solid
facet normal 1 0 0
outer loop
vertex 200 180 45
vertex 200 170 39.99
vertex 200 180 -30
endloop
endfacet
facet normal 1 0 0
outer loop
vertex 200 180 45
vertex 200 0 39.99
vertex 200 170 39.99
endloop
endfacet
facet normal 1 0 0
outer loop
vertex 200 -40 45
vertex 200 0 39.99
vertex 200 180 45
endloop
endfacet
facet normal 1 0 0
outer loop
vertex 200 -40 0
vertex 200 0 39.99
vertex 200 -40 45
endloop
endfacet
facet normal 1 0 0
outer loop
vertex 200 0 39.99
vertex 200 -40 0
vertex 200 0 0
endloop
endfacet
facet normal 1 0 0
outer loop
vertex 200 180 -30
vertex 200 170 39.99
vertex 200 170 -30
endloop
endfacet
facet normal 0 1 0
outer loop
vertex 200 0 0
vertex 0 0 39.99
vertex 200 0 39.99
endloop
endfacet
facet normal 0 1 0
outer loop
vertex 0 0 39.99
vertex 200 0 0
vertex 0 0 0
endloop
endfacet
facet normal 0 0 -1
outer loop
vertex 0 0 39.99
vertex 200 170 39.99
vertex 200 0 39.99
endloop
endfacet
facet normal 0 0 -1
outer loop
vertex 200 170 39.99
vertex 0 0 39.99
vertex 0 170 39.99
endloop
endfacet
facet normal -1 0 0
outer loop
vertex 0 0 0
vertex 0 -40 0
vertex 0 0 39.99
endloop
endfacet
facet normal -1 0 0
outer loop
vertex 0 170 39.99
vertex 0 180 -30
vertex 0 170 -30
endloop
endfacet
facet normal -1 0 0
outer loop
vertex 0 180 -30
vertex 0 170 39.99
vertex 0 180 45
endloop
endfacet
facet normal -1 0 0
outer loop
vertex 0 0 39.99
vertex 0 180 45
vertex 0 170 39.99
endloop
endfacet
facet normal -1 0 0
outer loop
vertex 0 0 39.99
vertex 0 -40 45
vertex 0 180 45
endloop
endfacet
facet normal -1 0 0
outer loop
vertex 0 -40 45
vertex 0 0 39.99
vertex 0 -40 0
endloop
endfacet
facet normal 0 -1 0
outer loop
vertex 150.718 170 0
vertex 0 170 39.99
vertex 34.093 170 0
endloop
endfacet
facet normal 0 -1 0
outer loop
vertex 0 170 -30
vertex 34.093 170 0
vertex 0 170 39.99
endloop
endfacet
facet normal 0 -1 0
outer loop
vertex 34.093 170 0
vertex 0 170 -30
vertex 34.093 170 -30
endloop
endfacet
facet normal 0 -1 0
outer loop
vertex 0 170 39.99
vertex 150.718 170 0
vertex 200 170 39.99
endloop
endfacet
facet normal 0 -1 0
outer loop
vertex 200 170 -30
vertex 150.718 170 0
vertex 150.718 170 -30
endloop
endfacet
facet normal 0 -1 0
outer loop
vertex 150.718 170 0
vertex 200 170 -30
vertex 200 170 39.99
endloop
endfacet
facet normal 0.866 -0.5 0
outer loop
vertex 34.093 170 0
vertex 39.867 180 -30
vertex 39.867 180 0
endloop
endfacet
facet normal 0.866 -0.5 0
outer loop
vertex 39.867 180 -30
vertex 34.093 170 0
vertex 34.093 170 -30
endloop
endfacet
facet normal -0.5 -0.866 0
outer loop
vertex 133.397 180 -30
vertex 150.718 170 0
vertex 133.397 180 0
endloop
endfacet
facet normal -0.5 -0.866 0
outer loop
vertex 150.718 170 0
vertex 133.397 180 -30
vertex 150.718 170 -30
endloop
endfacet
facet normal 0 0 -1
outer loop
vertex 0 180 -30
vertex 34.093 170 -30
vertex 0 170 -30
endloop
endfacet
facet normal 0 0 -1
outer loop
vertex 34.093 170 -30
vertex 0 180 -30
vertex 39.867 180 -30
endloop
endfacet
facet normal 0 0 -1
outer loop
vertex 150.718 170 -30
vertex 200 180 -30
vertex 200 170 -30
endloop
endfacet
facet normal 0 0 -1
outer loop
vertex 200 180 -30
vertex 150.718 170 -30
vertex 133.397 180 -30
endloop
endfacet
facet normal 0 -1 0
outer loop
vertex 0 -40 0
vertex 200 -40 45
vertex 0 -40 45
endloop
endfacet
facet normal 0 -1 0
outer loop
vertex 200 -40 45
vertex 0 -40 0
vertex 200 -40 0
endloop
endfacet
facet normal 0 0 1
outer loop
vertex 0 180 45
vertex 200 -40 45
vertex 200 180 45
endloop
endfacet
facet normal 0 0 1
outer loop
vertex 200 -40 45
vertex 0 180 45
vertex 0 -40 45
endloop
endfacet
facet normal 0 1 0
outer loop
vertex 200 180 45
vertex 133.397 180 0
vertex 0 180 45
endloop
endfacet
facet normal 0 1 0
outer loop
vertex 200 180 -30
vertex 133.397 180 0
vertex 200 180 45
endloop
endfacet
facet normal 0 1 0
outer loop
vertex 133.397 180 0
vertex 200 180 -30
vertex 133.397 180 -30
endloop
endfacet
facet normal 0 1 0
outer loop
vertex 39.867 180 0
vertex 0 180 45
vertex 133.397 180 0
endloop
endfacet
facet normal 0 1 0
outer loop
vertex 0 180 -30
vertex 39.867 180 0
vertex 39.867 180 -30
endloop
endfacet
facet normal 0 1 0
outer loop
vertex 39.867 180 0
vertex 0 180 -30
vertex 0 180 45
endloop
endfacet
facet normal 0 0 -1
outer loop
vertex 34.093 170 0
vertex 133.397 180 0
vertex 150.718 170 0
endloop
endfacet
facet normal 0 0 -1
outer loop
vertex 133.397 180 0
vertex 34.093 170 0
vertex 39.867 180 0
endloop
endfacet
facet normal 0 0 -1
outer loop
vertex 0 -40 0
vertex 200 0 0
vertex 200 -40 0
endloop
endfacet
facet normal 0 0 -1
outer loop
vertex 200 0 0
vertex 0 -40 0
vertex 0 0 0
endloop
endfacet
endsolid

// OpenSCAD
module wciecie() {
    mh = 166;
    mw = 181;
    cutout = 50;
    polygon([[0,0], [0,mh-cutout], [cutout, mh],  [mw,mh], [mw,0]]);
}

module powierzchnia_podstawy() {
    mh = 170;
    mw = 200;
    sh = 0;
    sw = 0;
    polygon([[sw,sh], [sw,mh], [mw, mh], [mw,sh]]);
}

module powierzchnia_nakladki() {
    mh = 100;
    mw = 210;
    sh = 0;
    sw = 00;
    polygon([[sw,sh], [sw,mh], [mw, mh], [mw,sh]]);
}

module wnetrze_nakladki() {
    mh = 200;
    mw = 190;
    sh = 0;
    sw = 00;
    polygon([[sw,sh], [sw,mh], [mw, mh], [mw,sh]]);
}

module wciecie_przednie_podst() {
    mh = 170;
    mw = 2000;
    sh = 0;
    sw = 0;
    polygon([[sw,sh], [sw,mh], [mw, mh], [mw,sh]]);
}

    //linear_extrude(height = 2, scale = 1)
    //    scale([1.05, 1.05, 1])
    //        wciecie();

module podstawa() {
    difference() {
        leg_length=30;
        thickness=40;
        translate([0,0,-leg_length])
            linear_extrude(height = leg_length+thickness, scale = 1)
                powierzchnia_podstawy();
        
        translate([220,130,-200])
            rotate(90+45+15)
            linear_extrude(height = 200, scale = 1)
                wciecie();
        
        translate([-10,-130,-200])
        linear_extrude(height = 200, scale = 1)
                wciecie_przednie_podst();
    }
}

module nakladka() {
    difference() {
        clamp_length = 40;
        height = 70;
        top_thickness = 10;
        eps=0.01;
        linear_extrude(height = clamp_length+height+top_thickness, scale = 1)
            powierzchnia_nakladki();
        
        translate([5,-10,-eps])
            linear_extrude(height = clamp_length+eps, scale = 1)
                powierzchnia_podstawy();
        
        translate([10,-10,clamp_length-eps])
            linear_extrude(height = height+eps, scale = 1)
                    wnetrze_nakladki();
        
        
        
    }
}

module powierzchnia_rozszerzenia() {
    mh = 180;
    mw = 200;
    sh = -40;
    sw = 00;
    polygon([[sw,sh], [sw,mh], [mw, mh], [mw,sh]]);
}

module wciecie_tylne_podst() {
    mh = 180;
    mw = 2000;
    sh = 0;
    sw = 0;
    polygon([[sw,sh], [sw,mh], [mw, mh], [mw,sh]]);
}

module rozszerenie() {
    leg_length=30;
    roz_height = 5;
    thickness=40;
    eps=0.01;
    podstawa_height= 40;
    difference() {
        translate([0,0,-leg_length])
         linear_extrude(height = podstawa_height+leg_length+roz_height, scale = 1)
            
            powierzchnia_rozszerzenia();
        
        translate([220,130,-200])
            rotate(90+45+15)
            linear_extrude(height = 200, scale = 1)
                wciecie();
        
        translate([-10,-130,-200])
        linear_extrude(height = 200, scale = 1)
                wciecie_przednie_podst();
        translate([0,0,-eps])
            podstawa();

        translate([-10,200,-200])
        linear_extrude(height = 200, scale = 1)
               wciecie_tylne_podst();
    }
}
rozszerenie();
//podstawa();
